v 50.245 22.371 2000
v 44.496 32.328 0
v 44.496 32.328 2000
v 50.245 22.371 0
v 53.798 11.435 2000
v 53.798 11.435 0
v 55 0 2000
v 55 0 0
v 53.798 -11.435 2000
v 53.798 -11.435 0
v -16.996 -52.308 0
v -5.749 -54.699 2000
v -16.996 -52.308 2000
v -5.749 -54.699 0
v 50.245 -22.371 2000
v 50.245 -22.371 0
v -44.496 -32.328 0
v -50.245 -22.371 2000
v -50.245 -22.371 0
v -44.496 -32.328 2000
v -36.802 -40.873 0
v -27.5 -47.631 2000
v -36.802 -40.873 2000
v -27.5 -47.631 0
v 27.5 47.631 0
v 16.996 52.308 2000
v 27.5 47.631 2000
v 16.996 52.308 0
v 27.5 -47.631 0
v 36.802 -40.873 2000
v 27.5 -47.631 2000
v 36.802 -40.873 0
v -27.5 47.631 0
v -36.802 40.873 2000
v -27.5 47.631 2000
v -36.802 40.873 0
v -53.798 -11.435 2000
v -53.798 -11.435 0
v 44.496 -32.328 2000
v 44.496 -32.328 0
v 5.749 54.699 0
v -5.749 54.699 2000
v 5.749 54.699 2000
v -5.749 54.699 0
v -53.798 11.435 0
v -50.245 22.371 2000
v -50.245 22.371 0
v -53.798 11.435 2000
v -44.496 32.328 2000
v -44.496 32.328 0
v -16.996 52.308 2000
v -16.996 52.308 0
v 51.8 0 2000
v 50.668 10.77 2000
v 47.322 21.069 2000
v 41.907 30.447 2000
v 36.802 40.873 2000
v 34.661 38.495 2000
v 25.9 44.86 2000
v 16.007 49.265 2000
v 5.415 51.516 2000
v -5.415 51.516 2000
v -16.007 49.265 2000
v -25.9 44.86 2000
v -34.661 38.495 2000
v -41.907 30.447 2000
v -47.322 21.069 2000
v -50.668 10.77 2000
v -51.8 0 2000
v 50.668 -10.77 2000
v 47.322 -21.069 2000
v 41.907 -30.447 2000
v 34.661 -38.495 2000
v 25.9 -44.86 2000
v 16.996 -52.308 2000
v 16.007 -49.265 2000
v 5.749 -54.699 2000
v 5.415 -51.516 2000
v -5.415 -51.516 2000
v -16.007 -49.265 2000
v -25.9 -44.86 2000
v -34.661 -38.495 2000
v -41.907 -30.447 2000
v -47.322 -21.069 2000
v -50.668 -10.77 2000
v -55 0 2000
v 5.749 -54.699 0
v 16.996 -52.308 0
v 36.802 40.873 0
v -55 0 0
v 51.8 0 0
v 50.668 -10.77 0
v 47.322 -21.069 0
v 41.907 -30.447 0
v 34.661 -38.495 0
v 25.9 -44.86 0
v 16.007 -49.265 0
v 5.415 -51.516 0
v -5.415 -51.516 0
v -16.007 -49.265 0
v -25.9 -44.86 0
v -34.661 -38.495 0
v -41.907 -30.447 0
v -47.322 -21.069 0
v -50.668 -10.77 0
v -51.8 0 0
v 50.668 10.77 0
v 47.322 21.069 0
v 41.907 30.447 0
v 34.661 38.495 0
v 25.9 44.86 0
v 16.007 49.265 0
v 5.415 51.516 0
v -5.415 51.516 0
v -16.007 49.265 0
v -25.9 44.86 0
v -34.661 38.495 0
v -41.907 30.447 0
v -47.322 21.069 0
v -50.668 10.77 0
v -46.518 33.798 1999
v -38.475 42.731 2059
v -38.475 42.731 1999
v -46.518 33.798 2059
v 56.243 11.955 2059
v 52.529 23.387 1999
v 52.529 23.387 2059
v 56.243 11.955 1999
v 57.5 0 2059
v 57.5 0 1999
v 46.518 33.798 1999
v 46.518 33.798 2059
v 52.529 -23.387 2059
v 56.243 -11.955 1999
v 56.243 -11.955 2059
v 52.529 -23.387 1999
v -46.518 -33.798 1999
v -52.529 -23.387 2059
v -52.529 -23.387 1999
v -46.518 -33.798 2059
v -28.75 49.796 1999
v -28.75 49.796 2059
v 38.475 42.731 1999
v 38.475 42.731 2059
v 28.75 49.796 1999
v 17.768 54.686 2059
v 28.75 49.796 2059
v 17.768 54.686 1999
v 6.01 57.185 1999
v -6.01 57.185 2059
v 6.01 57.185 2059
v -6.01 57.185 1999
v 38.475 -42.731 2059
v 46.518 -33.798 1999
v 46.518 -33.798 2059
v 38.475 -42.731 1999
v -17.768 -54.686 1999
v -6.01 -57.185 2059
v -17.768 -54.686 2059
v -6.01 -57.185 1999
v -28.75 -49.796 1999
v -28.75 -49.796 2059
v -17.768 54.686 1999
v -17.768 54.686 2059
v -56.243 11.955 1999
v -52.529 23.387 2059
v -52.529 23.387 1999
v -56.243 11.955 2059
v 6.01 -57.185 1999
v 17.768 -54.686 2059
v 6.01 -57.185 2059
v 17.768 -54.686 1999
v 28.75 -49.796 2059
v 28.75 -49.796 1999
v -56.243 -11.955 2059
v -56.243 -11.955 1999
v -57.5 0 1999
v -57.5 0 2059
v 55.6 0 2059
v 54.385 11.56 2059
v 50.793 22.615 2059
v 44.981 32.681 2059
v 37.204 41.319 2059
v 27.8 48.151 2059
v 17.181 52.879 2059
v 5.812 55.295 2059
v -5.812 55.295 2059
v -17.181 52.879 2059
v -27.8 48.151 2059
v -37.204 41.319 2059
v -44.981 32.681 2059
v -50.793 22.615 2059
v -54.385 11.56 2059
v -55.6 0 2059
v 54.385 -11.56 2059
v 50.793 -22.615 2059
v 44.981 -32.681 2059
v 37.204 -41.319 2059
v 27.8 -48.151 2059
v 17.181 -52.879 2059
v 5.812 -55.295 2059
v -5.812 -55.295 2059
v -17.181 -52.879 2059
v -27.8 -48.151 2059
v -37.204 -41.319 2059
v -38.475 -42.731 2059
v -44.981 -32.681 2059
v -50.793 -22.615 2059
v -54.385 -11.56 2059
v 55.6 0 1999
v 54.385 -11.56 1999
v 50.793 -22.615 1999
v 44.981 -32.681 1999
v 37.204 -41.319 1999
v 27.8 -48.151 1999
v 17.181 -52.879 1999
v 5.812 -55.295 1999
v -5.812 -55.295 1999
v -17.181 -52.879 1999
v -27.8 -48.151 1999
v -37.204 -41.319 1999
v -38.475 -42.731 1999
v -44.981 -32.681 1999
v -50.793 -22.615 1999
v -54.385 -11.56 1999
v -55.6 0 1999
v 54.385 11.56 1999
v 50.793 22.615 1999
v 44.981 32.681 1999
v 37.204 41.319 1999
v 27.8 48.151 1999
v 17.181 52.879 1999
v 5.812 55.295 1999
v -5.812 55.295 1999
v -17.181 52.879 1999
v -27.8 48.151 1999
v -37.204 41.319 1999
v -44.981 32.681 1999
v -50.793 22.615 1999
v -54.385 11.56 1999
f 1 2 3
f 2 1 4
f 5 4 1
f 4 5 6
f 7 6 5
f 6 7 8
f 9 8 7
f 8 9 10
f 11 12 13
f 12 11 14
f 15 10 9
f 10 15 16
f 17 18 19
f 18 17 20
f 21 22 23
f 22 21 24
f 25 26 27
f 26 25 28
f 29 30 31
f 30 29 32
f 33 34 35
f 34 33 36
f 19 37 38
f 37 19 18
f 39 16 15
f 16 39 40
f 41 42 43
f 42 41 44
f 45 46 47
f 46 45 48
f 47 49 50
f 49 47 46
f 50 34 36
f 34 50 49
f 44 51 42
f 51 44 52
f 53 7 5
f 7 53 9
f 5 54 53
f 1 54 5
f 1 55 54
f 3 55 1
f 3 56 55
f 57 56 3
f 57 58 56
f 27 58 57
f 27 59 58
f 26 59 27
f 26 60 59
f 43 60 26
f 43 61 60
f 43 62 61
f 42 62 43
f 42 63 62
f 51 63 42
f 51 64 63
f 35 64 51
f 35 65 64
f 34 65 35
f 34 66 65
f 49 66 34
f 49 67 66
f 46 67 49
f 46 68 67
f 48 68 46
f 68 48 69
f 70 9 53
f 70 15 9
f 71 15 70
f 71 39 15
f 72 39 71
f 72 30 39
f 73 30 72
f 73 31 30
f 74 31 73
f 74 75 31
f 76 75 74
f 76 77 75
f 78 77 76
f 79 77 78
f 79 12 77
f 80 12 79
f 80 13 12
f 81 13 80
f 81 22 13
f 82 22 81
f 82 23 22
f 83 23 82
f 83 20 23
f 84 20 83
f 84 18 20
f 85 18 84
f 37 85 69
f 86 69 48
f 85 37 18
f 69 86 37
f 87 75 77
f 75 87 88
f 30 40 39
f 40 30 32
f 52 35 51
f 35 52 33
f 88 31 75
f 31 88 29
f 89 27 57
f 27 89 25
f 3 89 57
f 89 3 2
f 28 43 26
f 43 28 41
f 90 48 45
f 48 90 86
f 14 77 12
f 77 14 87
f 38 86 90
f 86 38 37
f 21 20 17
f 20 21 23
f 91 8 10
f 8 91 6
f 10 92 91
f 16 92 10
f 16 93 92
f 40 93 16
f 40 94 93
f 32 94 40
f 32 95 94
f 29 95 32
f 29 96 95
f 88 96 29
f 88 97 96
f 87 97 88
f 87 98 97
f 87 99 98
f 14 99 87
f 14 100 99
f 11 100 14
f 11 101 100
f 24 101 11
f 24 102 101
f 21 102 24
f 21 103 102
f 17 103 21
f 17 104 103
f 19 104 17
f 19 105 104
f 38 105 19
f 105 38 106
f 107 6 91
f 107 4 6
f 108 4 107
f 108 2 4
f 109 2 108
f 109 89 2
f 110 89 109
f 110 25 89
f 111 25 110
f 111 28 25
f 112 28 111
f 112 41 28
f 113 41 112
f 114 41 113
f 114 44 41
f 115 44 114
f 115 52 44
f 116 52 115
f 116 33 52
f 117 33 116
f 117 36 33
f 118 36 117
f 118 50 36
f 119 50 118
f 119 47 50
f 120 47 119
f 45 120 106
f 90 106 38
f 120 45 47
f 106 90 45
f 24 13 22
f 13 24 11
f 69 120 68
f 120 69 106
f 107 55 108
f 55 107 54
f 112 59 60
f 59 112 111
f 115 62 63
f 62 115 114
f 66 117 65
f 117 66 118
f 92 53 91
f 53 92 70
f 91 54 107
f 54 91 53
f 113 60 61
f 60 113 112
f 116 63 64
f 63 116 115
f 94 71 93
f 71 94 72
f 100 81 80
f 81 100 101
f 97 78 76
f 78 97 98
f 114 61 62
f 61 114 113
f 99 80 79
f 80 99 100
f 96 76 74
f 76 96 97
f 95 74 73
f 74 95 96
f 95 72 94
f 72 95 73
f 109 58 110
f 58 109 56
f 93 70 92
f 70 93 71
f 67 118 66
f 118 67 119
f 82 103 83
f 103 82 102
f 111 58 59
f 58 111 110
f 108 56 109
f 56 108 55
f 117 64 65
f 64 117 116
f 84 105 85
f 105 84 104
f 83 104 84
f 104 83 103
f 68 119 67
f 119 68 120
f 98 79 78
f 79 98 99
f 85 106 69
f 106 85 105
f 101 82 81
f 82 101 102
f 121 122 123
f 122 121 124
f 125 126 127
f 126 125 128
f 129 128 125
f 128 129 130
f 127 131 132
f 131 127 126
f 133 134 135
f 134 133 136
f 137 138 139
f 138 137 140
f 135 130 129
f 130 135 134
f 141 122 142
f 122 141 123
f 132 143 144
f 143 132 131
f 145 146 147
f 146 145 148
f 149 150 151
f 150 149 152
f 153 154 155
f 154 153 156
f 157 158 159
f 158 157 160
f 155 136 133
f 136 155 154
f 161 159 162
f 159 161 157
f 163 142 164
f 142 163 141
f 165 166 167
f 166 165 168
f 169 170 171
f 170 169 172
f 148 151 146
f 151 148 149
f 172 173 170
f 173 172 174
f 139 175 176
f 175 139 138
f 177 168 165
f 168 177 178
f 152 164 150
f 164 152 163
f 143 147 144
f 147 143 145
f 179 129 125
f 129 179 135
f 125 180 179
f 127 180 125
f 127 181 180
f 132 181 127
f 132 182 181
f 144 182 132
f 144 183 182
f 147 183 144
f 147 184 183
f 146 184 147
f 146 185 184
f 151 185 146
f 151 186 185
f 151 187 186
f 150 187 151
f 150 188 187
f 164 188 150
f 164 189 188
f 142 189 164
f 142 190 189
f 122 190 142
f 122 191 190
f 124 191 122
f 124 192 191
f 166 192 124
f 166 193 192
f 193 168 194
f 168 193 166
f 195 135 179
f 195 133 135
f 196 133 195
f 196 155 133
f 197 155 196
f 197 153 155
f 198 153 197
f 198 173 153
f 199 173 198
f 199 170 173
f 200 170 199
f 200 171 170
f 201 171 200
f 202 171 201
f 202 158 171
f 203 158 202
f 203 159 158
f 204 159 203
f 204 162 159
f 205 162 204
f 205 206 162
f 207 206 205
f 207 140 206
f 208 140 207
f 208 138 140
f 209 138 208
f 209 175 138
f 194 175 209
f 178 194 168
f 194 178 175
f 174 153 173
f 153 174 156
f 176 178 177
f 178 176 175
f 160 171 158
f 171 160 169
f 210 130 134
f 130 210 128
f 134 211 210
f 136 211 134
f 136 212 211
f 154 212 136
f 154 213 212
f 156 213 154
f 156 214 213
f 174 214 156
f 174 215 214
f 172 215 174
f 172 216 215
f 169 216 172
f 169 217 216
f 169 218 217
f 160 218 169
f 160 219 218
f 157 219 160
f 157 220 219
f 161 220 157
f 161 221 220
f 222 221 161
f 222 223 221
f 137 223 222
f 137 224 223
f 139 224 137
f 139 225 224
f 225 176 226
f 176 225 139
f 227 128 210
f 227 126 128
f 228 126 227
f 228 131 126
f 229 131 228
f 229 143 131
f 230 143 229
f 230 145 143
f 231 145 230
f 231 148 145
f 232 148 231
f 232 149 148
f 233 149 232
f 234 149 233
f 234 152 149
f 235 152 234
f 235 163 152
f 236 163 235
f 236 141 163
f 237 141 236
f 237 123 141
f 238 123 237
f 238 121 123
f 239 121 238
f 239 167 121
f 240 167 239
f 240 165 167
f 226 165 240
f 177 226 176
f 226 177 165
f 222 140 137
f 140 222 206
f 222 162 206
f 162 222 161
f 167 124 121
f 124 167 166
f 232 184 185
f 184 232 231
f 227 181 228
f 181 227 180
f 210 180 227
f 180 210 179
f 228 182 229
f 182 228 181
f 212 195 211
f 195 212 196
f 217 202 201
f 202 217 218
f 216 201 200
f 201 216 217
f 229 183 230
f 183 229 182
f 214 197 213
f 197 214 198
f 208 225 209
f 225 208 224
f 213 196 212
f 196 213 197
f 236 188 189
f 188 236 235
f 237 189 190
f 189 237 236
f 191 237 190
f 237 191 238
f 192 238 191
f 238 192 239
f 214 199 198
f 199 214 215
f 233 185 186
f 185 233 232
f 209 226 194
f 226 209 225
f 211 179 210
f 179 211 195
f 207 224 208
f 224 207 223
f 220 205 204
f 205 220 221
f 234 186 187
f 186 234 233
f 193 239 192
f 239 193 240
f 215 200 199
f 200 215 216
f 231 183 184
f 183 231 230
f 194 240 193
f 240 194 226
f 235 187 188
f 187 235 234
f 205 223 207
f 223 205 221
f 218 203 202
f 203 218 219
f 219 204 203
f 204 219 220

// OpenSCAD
// Parameters
pipe_standard = 1; //[1:1:1]
nominal_diameter_mm = 110; //[55:220:1]
length_mm = 2000; //[1000:4000:10]
outer_diameter_mm = 110; //[55:220:1]
wall_thickness_mm = 3.2; //[1.6:6.4:0.1]
inner_diameter_mm = 103.6; //[51.8:207.2:0.1]
include_end_fitting = 1; //[0:1:1]
overlap_mm = 1; //[0.5:2:0.1]
fitting_length_mm = 60; //[30:120:1]
fitting_wall_extra_mm = 2.5; //[1:6:0.1]
fitting_inner_clearance_mm = 0.6; //[0.2:1.5:0.1]
fitting_stop_thickness_mm = 3; //[1:8:0.5]
fitting_stop_position_from_end_mm = 25; //[10:80:1]

// HT Pipe - complete geometry
module ht_pipe() {
  color([0.85, 0.85, 0.8]) {
    // Hollow tube body
    difference() {
      cylinder(h=length_mm, r=outer_diameter_mm/2, center=false);
      translate([0, 0, -overlap_mm])
        cylinder(h=length_mm + 2*overlap_mm, r=outer_diameter_mm/2 - wall_thickness_mm, center=false);
    }
    
    // End fitting geometry
    if (include_end_fitting) {
      difference() {
        translate([0, 0, length_mm - overlap_mm])
          cylinder(h=fitting_length_mm, r=outer_diameter_mm/2 + fitting_wall_extra_mm, center=false);
        translate([0, 0, length_mm - 2*overlap_mm])
          cylinder(h=fitting_length_mm + 2*overlap_mm, r=outer_diameter_mm/2 + fitting_inner_clearance_mm, center=false);
        translate([0, 0, length_mm - overlap_mm + fitting_stop_position_from_end_mm - fitting_stop_thickness_mm/2 - overlap_mm])
          cylinder(h=fitting_stop_thickness_mm + 2*overlap_mm, r=outer_diameter_mm/2 + fitting_inner_clearance_mm, center=false);
      }
    }
  }
}

// Assembly
module assembly() {
  ht_pipe();
}

assembly();
